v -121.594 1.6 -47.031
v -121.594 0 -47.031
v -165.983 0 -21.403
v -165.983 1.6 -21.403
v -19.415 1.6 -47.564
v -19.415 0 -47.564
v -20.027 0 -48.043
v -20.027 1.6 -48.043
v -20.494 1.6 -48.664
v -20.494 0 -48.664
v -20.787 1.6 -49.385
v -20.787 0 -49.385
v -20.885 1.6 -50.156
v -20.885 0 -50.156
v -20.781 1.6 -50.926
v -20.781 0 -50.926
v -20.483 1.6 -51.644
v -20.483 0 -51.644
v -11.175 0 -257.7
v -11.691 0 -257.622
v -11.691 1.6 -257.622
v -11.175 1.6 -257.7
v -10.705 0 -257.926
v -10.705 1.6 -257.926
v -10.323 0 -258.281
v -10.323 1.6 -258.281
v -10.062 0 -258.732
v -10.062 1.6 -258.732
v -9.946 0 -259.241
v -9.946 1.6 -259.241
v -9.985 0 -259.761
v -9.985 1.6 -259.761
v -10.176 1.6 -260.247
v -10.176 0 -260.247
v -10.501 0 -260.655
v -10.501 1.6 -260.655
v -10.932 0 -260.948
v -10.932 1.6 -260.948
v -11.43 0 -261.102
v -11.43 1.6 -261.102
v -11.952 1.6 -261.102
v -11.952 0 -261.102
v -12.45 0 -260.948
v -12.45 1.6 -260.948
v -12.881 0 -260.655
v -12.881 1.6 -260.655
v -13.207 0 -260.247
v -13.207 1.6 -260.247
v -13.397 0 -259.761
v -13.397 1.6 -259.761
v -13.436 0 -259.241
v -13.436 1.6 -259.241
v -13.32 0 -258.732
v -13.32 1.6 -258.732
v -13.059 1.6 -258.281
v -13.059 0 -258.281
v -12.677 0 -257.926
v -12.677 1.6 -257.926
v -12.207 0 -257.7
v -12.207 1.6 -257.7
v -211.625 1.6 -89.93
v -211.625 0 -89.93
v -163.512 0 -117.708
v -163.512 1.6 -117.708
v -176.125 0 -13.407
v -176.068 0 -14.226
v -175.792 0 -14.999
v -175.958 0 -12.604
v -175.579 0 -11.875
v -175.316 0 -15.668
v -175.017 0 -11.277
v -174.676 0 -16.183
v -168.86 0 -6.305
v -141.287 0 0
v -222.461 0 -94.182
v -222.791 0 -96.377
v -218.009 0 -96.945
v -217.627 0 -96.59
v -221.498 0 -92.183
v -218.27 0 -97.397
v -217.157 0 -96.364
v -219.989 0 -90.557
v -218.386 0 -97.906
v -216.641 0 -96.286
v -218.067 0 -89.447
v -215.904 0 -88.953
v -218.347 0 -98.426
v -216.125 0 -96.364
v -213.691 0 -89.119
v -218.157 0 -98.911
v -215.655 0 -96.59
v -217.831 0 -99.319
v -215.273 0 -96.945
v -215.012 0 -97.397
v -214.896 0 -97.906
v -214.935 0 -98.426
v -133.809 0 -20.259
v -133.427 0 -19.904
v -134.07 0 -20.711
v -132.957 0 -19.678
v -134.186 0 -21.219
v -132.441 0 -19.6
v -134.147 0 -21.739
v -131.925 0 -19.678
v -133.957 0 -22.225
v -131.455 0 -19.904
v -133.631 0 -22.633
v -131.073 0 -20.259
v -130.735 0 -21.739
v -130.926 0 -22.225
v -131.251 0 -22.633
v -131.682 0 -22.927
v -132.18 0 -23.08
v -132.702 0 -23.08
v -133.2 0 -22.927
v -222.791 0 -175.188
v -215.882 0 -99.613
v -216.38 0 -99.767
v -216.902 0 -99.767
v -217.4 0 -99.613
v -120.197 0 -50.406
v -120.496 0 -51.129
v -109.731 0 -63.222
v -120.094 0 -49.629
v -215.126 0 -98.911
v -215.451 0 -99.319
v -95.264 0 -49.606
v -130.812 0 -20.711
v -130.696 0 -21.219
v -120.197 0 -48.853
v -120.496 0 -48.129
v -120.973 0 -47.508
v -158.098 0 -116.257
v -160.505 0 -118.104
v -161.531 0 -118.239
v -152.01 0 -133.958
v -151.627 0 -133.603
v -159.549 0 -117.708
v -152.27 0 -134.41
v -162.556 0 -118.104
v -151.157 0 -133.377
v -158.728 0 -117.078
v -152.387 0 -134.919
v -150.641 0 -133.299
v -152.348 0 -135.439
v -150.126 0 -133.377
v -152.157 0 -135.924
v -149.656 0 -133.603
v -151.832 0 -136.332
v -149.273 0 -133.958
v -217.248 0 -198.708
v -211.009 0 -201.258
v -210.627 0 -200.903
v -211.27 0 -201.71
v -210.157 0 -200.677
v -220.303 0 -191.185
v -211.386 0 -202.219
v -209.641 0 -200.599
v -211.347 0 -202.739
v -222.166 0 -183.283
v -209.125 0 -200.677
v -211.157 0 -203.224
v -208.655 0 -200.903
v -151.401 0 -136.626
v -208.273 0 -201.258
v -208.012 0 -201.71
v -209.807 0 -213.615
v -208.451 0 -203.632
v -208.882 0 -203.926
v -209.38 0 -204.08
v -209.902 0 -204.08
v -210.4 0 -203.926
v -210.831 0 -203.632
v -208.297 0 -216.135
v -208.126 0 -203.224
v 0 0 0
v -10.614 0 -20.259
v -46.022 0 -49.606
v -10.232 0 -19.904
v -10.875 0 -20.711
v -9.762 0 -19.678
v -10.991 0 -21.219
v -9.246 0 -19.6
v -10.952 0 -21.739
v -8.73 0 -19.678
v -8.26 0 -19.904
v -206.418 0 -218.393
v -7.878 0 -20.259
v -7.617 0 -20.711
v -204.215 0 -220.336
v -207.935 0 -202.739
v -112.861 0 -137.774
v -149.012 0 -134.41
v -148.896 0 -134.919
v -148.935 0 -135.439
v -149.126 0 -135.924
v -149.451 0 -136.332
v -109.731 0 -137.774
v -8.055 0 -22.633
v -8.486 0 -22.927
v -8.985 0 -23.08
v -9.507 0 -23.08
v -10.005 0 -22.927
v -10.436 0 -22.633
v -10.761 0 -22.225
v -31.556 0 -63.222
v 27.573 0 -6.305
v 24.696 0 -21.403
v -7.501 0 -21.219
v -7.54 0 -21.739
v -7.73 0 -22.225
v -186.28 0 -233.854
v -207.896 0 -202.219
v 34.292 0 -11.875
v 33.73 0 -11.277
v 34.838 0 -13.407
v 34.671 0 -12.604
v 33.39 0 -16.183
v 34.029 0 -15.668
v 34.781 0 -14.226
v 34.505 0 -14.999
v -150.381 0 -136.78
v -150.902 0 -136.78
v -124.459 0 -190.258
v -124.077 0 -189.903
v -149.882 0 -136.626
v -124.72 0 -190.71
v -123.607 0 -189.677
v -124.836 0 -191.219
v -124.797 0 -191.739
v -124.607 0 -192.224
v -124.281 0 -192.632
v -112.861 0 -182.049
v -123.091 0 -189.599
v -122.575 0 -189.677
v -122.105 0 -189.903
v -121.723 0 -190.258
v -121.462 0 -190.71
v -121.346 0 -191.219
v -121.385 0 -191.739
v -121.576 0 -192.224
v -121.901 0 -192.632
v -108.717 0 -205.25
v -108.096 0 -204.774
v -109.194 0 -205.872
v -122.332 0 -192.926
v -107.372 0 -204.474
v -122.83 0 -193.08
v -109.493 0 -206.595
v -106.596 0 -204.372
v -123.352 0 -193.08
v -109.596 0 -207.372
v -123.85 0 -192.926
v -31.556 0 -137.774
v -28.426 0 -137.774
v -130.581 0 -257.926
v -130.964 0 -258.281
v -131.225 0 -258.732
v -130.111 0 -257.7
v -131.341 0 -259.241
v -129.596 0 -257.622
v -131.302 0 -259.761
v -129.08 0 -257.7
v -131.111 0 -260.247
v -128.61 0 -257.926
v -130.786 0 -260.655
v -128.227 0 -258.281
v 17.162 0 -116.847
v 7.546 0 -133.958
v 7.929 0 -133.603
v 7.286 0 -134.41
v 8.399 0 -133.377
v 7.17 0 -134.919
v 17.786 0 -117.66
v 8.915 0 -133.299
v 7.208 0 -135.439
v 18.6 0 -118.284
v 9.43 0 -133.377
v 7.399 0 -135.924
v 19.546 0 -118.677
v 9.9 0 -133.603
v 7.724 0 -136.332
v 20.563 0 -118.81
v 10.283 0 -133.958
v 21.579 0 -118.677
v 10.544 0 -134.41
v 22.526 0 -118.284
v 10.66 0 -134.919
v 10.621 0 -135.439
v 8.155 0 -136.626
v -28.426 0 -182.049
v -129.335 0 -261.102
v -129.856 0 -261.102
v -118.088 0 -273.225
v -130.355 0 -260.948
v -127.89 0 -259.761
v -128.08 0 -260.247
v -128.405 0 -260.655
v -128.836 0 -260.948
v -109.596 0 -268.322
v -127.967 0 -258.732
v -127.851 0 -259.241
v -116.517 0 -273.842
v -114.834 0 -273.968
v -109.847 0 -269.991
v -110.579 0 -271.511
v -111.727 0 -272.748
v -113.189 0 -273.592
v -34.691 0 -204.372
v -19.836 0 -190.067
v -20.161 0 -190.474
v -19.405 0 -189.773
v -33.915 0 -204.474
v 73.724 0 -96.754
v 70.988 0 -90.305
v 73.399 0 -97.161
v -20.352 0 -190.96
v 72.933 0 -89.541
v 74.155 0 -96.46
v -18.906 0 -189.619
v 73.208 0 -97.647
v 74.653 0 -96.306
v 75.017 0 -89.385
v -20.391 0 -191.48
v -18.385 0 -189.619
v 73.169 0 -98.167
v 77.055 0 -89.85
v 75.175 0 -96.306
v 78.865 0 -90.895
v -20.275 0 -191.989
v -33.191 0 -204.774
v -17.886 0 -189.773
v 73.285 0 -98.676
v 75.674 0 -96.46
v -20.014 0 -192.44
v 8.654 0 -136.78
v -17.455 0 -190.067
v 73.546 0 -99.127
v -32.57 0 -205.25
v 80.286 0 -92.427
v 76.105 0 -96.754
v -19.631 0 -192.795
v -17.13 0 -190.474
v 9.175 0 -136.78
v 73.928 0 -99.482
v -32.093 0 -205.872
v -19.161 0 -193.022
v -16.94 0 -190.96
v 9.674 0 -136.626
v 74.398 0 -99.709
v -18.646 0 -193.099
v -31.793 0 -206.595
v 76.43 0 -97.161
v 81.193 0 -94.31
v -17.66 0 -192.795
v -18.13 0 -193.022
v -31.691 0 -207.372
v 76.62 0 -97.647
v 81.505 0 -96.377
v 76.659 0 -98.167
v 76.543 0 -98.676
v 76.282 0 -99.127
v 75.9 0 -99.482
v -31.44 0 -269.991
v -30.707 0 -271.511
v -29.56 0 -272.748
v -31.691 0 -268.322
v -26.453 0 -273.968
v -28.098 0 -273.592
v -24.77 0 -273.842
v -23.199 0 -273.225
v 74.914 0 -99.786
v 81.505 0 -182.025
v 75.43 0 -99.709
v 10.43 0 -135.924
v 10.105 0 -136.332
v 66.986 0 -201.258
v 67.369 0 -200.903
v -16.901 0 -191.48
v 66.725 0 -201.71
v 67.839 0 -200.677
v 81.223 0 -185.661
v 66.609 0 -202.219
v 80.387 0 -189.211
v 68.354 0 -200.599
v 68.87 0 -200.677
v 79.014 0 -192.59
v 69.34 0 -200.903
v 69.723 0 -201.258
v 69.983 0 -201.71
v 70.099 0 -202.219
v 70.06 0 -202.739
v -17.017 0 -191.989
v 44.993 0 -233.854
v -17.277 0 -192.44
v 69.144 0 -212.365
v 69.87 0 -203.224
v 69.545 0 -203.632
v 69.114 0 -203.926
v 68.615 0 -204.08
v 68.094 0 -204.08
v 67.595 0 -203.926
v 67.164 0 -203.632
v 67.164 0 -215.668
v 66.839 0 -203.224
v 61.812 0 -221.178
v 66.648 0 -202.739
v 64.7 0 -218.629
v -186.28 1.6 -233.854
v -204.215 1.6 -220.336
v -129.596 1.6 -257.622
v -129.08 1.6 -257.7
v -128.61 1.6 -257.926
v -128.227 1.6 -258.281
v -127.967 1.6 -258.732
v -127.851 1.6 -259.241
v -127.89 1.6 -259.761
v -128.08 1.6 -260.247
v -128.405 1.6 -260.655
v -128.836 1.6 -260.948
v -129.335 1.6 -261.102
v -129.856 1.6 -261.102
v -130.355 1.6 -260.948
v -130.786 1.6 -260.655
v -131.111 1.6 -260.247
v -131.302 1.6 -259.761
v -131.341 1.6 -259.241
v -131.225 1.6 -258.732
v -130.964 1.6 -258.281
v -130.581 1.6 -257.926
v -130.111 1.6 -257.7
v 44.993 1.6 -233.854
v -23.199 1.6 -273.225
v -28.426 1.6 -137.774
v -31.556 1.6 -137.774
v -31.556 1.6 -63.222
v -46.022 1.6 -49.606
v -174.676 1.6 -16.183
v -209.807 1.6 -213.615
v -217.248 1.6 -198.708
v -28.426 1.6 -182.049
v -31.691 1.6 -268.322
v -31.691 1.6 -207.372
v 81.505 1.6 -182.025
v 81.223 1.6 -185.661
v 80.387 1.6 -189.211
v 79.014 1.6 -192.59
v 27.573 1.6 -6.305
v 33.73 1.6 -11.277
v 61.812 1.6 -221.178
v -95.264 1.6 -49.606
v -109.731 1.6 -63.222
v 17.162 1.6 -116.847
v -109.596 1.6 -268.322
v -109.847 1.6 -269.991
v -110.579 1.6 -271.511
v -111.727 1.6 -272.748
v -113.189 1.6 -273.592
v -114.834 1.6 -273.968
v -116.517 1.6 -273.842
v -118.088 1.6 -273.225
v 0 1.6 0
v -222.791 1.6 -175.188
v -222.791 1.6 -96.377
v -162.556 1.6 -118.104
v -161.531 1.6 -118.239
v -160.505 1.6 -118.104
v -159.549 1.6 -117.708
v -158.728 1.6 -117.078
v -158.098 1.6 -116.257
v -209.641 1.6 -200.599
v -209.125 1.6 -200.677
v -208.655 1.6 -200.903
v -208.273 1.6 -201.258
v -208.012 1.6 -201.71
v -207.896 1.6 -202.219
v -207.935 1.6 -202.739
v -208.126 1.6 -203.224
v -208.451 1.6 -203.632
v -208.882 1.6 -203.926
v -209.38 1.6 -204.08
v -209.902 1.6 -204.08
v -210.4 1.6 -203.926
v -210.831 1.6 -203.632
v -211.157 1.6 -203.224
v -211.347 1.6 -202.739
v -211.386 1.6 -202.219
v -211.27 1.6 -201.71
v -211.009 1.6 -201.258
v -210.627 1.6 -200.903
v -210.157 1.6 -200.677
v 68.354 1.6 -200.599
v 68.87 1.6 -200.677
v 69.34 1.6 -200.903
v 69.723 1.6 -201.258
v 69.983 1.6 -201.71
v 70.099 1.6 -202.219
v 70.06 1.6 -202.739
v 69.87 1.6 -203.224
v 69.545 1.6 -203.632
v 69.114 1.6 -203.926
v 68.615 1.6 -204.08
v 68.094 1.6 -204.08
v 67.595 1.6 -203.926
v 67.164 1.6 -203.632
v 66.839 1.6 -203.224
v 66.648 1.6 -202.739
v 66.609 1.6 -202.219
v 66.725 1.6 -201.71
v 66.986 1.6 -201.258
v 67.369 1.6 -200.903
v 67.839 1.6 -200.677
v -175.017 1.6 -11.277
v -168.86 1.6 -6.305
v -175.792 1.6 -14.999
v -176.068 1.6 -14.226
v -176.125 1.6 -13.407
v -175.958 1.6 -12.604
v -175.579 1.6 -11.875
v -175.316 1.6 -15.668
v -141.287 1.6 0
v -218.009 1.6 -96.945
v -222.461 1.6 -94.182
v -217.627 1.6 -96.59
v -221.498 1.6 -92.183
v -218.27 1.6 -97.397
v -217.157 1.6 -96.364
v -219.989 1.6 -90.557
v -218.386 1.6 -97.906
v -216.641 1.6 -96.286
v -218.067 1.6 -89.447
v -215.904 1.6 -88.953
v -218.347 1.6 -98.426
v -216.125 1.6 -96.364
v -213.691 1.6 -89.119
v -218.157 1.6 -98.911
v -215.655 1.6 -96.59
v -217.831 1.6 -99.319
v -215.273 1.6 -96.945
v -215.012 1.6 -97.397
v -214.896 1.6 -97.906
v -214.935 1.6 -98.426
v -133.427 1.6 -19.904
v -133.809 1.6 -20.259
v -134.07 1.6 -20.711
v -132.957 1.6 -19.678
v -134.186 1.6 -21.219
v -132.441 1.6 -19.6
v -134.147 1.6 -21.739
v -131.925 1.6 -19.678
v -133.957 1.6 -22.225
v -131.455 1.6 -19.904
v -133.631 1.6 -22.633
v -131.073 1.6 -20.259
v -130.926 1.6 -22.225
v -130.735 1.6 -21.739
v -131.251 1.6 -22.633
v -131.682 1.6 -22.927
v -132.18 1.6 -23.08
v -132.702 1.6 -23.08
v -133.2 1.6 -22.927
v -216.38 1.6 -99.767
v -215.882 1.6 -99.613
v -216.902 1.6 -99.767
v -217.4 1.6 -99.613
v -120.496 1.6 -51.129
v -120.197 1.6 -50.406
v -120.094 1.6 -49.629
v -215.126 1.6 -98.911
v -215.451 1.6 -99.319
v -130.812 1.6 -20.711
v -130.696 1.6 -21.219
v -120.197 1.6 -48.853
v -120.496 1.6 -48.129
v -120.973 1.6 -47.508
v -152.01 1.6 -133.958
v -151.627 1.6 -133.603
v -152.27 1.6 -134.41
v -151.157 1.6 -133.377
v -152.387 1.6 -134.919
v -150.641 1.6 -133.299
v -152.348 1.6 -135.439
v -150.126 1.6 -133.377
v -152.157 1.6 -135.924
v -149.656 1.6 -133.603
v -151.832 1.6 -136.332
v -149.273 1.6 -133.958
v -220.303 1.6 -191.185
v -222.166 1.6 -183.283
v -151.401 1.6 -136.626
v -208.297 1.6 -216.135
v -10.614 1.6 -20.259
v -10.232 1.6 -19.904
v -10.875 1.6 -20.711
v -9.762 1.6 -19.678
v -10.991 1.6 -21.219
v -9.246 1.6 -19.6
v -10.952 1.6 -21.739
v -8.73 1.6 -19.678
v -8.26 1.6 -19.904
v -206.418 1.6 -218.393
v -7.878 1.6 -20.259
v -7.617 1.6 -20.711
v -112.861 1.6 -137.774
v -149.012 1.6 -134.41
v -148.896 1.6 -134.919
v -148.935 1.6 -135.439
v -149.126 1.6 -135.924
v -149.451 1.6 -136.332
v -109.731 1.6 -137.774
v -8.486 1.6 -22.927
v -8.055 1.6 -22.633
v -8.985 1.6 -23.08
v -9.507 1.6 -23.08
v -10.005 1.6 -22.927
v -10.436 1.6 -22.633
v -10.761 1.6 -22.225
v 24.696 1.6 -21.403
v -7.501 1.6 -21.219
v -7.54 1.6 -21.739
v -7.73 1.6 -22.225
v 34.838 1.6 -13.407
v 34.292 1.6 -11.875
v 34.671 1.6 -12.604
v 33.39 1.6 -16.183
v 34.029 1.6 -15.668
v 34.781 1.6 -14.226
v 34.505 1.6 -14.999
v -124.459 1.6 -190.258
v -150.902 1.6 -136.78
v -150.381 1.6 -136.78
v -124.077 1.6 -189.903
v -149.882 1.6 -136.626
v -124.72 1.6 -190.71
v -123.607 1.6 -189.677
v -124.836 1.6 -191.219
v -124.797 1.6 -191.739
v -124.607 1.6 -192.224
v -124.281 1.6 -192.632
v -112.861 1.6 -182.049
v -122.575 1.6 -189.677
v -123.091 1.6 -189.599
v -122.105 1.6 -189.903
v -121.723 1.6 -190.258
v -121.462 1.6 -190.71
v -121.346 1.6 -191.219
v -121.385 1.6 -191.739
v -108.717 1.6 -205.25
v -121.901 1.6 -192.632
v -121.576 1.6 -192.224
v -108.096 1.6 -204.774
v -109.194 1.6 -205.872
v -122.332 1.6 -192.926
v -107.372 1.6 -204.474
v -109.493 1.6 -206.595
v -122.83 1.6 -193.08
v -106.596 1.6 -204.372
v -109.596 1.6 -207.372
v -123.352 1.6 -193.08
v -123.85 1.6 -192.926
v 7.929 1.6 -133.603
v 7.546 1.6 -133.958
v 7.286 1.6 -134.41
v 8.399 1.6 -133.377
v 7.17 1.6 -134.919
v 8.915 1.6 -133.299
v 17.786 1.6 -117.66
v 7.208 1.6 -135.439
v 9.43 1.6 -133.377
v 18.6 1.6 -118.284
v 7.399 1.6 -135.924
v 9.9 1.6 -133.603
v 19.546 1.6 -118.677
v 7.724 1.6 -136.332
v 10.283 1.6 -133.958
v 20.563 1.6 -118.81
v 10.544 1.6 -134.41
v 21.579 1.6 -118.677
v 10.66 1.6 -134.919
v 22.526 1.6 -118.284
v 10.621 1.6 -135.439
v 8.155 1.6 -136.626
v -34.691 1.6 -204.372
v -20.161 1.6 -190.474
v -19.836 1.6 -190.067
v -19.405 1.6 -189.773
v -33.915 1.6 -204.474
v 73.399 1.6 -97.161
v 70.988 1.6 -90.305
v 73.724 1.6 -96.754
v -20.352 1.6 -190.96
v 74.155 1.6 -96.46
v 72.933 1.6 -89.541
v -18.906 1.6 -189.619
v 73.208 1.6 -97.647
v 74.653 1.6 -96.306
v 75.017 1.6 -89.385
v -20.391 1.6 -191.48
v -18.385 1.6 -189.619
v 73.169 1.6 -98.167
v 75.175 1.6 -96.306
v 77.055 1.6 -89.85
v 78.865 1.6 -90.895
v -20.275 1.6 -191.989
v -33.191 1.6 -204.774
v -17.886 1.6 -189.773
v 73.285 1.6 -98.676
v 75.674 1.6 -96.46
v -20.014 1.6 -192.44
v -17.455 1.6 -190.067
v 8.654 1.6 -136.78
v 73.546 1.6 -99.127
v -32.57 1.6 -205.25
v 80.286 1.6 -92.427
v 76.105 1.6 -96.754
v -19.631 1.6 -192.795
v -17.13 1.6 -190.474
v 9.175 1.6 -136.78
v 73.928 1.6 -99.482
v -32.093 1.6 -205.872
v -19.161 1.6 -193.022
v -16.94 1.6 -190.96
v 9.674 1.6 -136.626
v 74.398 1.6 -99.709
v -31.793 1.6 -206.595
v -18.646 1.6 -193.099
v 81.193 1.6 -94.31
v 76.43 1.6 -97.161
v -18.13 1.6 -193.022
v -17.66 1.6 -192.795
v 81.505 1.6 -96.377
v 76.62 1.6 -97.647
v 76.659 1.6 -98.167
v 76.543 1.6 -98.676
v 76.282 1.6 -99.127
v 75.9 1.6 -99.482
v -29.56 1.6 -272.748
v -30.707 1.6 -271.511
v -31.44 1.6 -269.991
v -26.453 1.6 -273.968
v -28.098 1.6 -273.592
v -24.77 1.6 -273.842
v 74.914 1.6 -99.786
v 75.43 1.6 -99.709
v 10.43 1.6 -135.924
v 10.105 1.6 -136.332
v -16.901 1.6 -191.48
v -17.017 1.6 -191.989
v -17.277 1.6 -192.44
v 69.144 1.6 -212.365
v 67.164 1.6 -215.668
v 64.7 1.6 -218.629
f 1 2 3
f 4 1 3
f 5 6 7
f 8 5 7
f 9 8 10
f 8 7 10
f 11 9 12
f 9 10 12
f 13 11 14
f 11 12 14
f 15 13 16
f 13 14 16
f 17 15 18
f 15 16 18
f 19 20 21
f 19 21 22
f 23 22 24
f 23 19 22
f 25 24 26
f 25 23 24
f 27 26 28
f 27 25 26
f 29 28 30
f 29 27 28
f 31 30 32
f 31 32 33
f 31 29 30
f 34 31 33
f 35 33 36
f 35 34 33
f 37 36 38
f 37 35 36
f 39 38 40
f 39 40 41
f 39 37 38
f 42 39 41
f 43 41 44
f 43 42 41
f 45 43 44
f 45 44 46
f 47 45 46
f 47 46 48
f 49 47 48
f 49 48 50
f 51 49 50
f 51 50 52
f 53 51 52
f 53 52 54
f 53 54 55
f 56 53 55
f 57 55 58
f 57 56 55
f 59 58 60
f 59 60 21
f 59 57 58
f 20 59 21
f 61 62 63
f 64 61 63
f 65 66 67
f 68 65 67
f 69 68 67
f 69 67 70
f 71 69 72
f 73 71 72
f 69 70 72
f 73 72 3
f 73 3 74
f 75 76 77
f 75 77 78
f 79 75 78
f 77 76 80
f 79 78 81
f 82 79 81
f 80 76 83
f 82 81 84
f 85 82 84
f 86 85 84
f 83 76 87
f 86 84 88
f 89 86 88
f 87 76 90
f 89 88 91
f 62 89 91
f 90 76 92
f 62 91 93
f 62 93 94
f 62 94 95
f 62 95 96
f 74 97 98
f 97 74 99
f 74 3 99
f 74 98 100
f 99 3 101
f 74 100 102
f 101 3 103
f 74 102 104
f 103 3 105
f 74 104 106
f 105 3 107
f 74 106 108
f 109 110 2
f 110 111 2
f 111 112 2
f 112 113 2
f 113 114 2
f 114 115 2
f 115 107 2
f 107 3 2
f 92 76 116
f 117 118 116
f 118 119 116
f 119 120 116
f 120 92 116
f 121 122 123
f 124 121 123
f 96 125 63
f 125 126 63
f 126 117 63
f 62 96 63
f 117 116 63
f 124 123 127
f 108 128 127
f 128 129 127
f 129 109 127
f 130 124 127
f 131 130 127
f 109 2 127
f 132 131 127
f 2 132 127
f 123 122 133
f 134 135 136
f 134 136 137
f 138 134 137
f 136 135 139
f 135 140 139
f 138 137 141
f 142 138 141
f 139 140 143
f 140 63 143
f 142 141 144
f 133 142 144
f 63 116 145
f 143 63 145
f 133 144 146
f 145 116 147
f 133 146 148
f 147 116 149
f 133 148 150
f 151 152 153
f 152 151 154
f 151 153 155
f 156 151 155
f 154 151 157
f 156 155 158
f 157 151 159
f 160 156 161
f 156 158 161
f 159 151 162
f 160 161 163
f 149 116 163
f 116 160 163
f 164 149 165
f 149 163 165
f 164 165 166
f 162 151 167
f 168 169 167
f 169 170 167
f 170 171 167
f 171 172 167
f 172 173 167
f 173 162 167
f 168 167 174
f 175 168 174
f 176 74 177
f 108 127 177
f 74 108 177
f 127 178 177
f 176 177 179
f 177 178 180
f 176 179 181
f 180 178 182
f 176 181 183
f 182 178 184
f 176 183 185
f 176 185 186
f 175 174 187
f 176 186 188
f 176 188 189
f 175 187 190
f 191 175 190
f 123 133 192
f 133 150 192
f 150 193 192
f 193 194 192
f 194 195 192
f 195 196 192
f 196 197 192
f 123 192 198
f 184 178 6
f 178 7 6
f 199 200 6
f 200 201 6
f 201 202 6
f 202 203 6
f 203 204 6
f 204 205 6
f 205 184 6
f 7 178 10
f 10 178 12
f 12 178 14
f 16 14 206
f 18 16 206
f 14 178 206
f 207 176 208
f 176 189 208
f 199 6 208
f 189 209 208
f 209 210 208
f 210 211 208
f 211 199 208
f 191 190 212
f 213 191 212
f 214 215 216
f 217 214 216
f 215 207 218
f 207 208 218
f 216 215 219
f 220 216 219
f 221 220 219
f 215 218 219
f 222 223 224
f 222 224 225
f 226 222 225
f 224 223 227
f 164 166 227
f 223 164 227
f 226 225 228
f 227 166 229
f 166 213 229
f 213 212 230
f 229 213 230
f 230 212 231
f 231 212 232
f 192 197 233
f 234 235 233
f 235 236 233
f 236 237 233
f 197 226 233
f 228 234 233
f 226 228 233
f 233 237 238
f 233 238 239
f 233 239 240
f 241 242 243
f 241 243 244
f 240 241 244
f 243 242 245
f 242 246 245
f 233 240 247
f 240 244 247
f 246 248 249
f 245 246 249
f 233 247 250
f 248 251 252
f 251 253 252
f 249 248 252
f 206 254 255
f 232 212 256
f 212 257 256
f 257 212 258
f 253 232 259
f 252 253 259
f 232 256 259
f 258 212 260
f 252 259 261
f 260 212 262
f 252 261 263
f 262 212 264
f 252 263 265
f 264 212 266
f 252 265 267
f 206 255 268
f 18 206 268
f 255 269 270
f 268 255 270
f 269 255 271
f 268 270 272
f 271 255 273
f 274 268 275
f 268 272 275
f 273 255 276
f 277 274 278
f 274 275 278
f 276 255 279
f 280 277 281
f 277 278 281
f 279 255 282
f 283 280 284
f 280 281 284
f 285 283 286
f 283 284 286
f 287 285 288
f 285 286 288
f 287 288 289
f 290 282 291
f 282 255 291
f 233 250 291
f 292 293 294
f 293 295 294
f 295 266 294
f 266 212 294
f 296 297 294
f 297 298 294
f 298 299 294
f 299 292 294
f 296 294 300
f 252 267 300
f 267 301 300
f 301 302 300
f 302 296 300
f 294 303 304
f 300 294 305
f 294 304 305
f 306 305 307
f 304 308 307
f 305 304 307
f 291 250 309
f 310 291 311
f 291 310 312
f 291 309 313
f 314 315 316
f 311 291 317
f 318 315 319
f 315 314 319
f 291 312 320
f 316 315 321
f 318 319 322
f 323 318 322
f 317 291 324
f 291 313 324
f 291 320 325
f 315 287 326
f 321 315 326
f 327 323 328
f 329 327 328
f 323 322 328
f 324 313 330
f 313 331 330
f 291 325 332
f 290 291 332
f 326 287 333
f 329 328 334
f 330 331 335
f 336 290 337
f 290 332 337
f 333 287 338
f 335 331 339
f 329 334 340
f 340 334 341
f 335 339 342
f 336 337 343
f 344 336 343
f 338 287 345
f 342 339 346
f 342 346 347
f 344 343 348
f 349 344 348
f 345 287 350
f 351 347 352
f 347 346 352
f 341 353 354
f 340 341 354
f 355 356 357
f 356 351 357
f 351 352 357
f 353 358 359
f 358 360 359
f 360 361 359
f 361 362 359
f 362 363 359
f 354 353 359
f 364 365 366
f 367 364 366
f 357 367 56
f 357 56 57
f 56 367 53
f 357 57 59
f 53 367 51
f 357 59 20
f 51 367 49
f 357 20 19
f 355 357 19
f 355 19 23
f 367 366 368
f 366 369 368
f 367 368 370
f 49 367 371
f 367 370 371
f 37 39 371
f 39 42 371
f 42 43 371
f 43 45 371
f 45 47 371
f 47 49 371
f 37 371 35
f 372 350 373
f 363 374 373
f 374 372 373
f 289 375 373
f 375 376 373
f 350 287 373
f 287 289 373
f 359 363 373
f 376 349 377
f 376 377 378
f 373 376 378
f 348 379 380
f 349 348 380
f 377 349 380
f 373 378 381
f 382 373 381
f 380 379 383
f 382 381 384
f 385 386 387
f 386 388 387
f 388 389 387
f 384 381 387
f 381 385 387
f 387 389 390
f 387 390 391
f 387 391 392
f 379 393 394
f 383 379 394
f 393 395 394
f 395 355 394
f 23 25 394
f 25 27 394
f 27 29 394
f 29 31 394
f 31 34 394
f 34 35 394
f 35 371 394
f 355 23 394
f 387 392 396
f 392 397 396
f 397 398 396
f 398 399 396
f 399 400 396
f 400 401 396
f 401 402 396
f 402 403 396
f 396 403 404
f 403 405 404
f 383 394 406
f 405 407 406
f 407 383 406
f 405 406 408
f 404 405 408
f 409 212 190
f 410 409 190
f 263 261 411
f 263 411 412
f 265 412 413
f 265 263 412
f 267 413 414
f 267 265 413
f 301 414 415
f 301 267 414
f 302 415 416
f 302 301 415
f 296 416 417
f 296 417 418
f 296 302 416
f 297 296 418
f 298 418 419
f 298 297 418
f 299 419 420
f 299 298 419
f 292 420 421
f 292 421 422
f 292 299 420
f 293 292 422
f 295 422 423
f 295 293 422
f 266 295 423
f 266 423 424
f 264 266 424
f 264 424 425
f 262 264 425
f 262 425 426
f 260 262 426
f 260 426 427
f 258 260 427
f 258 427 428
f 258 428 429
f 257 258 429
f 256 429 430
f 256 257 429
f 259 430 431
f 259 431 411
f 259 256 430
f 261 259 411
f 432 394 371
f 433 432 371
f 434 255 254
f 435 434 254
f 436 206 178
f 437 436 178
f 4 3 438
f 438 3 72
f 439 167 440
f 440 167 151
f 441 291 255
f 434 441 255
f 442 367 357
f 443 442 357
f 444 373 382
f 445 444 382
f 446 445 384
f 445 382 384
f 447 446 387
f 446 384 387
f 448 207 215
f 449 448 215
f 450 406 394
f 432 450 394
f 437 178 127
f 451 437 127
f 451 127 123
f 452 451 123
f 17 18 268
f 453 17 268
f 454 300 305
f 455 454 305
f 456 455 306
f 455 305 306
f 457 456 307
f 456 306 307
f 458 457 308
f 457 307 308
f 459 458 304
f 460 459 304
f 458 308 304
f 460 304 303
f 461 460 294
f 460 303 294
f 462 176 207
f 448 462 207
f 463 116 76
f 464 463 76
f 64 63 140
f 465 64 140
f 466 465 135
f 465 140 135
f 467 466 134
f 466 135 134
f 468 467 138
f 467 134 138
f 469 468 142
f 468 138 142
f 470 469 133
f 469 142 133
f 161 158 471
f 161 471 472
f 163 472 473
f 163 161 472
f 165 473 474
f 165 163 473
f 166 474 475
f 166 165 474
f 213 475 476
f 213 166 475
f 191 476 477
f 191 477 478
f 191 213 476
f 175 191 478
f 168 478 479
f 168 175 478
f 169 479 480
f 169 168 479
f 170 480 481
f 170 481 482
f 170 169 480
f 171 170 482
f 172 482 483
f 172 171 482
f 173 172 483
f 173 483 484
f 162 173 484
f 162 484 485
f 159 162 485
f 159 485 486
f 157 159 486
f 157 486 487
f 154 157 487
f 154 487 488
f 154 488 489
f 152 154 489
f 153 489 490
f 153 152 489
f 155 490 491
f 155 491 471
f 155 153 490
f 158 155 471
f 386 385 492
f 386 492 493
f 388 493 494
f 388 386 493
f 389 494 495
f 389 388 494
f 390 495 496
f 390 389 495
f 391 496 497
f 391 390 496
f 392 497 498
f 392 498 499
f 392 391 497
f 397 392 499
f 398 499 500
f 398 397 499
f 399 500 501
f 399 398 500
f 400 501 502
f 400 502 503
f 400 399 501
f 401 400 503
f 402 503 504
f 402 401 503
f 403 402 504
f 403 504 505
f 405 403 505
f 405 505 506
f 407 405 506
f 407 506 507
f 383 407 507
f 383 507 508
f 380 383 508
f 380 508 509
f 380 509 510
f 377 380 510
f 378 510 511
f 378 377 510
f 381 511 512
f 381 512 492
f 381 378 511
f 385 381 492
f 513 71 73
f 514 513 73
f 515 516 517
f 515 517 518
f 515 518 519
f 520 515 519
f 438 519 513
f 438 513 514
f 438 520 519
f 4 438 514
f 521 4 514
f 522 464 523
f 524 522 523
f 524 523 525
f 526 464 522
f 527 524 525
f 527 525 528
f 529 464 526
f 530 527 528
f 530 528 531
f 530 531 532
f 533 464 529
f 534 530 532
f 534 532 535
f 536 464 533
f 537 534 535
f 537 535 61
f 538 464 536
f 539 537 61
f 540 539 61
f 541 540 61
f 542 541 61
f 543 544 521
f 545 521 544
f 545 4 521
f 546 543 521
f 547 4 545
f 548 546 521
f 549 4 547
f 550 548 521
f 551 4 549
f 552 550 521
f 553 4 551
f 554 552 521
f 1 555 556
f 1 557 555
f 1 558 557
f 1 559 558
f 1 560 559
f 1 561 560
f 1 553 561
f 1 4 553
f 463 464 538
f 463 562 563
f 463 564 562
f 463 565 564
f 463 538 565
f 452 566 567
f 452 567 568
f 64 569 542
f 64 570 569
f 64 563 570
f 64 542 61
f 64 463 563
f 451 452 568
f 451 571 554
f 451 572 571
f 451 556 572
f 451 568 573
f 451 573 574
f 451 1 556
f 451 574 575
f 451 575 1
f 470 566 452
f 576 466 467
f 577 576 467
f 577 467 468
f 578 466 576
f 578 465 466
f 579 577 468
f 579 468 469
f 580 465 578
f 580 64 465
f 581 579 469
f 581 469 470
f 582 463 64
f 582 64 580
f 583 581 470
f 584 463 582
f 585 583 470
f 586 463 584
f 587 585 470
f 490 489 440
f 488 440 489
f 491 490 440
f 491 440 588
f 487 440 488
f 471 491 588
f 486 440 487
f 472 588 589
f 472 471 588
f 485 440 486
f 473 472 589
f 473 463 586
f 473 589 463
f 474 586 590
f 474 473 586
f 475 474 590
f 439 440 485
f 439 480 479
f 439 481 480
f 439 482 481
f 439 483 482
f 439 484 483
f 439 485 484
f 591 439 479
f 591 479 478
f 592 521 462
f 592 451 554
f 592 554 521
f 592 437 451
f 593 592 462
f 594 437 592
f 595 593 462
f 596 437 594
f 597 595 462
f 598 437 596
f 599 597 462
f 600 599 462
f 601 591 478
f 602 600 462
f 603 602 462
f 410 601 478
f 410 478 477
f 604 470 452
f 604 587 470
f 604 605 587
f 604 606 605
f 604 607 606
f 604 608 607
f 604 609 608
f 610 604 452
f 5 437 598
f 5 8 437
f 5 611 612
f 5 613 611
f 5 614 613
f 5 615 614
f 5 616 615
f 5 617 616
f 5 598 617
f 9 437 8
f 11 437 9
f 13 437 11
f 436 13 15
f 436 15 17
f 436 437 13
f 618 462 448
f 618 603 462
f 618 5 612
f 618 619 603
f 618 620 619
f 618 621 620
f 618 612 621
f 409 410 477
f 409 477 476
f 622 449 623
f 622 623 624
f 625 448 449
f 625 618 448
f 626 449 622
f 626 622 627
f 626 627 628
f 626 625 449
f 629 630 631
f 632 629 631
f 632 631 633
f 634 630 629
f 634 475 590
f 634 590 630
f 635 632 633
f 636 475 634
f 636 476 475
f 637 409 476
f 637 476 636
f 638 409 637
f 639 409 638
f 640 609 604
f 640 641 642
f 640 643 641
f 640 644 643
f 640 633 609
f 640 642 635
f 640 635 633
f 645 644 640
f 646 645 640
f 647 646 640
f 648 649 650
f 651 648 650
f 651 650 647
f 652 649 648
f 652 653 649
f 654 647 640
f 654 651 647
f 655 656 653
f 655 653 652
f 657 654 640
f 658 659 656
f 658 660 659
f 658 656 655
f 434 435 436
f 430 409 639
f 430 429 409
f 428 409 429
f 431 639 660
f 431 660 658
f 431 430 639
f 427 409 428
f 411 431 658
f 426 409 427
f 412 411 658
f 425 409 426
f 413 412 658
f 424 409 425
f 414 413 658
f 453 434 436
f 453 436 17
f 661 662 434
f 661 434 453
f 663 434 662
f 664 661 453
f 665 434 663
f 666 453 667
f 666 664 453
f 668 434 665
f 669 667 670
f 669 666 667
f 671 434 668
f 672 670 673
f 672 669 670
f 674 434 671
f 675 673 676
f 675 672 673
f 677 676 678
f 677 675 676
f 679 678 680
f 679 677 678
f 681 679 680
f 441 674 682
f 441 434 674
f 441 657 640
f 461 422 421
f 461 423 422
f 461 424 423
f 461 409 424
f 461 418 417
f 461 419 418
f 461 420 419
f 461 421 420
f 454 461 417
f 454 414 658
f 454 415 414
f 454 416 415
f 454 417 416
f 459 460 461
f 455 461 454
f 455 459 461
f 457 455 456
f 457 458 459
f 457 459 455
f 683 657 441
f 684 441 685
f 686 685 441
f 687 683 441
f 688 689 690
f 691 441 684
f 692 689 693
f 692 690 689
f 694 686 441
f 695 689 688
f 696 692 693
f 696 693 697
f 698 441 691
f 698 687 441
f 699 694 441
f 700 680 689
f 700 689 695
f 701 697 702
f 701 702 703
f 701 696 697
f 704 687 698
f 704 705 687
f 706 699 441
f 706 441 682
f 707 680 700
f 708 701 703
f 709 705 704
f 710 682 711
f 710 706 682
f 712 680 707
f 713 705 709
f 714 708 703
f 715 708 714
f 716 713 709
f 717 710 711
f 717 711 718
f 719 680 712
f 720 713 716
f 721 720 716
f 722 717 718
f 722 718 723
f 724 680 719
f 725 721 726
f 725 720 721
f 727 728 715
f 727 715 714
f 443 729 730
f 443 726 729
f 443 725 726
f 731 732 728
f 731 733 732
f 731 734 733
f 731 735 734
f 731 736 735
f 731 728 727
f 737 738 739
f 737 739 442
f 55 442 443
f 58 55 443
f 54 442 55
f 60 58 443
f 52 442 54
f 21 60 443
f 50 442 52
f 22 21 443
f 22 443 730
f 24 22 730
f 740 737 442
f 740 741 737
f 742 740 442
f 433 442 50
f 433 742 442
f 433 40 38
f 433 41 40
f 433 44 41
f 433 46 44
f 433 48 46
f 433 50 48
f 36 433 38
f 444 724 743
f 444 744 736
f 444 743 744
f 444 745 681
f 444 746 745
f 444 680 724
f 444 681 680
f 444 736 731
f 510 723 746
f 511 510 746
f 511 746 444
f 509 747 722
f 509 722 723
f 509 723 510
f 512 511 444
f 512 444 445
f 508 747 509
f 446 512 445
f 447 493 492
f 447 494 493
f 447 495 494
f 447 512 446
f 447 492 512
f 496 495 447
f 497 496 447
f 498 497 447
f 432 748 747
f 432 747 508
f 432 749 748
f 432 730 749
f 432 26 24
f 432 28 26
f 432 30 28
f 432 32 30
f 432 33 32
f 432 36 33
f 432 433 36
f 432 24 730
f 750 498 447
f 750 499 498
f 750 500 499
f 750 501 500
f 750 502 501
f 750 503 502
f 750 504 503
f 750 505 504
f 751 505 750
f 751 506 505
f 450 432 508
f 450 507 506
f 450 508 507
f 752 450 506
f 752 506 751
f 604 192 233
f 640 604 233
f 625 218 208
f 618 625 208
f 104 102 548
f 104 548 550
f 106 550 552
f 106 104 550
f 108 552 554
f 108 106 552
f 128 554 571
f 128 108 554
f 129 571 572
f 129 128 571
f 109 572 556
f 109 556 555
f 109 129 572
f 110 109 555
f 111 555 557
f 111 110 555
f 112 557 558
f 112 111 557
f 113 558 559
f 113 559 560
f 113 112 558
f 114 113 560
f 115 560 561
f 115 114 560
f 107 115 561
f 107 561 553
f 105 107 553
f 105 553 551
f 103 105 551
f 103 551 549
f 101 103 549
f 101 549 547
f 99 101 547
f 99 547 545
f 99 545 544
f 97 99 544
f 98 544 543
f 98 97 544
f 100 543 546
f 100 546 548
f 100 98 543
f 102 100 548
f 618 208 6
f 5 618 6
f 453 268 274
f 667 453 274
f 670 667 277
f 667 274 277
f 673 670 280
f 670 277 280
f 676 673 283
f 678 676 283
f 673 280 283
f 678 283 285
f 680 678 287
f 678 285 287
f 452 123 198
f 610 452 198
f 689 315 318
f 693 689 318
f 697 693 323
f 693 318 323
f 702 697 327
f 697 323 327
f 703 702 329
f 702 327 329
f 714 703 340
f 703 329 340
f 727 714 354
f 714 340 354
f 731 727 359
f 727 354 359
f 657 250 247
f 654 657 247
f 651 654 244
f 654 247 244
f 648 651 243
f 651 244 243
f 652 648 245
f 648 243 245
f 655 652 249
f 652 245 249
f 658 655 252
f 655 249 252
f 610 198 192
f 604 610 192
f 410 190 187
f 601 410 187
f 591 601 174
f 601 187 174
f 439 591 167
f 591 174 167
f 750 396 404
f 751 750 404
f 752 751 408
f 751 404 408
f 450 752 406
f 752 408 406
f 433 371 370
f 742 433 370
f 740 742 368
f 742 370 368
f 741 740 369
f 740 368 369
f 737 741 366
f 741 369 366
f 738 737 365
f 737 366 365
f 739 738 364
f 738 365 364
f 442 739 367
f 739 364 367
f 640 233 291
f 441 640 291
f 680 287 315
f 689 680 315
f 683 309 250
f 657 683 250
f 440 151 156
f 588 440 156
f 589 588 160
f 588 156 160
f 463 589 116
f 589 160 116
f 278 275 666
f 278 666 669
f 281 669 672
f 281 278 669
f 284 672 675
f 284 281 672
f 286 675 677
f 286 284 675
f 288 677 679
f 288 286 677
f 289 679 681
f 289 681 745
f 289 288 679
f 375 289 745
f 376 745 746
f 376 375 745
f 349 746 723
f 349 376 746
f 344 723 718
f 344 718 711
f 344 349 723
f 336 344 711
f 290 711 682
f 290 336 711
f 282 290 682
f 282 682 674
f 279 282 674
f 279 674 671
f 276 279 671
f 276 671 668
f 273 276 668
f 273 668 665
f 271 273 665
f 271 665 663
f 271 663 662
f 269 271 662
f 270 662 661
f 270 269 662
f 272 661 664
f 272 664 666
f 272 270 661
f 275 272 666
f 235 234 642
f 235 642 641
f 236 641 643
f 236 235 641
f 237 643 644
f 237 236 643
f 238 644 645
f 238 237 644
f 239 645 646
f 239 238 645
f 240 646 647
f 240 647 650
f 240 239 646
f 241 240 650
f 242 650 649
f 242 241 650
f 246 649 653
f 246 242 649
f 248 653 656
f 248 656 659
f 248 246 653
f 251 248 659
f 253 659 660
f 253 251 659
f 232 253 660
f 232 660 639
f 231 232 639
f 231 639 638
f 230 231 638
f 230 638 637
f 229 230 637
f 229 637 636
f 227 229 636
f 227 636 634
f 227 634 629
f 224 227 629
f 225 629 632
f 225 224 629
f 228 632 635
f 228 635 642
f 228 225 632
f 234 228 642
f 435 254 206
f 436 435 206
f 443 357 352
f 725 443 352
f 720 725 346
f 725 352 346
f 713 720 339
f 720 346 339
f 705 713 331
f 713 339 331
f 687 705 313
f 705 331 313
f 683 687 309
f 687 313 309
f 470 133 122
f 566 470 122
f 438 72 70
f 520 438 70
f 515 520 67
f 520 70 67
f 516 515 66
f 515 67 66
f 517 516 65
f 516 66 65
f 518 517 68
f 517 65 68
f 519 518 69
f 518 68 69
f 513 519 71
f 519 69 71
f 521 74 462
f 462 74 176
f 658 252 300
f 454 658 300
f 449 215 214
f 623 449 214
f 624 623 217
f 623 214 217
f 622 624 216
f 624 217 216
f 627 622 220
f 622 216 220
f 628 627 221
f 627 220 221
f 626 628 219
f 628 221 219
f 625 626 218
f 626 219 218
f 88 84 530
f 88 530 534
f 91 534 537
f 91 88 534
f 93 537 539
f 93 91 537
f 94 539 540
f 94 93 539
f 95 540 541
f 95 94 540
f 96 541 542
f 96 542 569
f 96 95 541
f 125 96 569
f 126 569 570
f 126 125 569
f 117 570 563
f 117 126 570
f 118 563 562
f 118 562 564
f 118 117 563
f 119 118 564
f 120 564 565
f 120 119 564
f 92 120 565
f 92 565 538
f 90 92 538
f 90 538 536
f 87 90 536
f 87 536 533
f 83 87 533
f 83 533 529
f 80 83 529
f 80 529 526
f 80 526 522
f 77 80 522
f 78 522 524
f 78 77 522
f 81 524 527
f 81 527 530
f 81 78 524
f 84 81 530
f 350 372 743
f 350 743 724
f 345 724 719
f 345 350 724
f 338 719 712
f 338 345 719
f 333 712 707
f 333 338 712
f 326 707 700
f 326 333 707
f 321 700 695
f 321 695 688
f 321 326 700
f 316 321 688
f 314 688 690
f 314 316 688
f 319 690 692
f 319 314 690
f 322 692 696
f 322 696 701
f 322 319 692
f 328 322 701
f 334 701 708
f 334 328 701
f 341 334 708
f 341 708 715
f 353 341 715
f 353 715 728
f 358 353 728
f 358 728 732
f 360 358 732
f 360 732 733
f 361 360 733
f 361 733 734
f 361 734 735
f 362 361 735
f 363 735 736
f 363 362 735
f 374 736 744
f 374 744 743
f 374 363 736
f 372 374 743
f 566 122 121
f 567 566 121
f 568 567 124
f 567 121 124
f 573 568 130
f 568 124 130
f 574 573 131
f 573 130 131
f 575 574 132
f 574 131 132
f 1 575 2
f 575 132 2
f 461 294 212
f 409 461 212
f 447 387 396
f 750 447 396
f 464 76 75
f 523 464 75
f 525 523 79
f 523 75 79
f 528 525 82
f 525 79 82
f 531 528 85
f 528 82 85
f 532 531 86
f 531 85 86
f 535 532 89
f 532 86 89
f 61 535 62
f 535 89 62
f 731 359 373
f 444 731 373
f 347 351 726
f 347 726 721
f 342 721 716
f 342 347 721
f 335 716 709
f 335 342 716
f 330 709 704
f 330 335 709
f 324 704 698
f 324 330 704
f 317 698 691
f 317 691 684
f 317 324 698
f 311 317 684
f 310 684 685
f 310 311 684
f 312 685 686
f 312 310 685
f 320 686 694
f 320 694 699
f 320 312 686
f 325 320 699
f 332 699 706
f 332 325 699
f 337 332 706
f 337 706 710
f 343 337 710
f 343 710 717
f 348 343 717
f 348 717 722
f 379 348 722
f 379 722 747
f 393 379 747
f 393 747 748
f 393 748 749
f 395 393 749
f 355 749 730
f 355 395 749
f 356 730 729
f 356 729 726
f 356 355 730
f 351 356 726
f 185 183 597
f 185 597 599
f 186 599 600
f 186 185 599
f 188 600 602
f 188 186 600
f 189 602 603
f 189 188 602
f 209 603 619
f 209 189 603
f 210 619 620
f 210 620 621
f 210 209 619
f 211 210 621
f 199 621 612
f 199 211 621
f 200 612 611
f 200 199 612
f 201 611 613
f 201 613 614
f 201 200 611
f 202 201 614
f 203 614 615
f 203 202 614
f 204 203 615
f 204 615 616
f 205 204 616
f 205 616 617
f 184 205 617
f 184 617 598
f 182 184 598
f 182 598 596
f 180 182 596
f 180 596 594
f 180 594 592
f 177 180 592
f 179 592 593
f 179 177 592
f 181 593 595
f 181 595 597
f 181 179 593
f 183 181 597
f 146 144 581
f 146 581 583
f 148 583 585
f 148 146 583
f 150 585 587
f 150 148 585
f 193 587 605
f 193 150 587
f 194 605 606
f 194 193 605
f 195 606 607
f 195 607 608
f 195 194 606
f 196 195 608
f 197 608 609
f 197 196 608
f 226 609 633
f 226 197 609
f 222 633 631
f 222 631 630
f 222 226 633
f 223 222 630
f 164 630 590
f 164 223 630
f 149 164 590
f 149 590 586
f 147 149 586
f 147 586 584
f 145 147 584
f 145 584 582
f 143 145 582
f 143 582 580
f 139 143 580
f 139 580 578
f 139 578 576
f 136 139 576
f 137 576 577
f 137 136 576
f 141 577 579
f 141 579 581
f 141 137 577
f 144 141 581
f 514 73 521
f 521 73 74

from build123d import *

# Parameters (mm, degrees)
SKETCH1_R           = 1.75
BOSS_EXTRUDE1_DEPTH = 1.6


with BuildPart() as part:
    # Sketch1 → Boss-Extrude1 (new body)
    with BuildSketch(Plane(origin=(0, 0, 0), x_dir=(1, 0, 0), z_dir=(0, 1, 0))):
        with BuildLine():
            Line((24.696313384, 21.403189927), (-19.414899465, 47.563680085))
            ThreePointArc((-19.414899465, 47.563680085), (-20.786874634, 49.384536896), (-20.482680557, 51.644028288))
            Line((-20.482680557, 51.644028288), (17.162414168, 116.847245007))
            ThreePointArc((17.162414168, 116.847245007), (19.546471274, 118.676596366), (22.525800971, 118.28436017))
            Line((22.525800971, 118.28436017), (70.987796177, 90.304814192))
            ThreePointArc((70.987796177, 90.304814192), (77.999004119, 90.304814192), (81.50460809, 96.376698381))
            Line((81.50460809, 96.376698381), (81.50460809, 182.02519482))
            ThreePointArc((81.50460809, 182.02519482), (80.873629228, 187.452491566), (79.01435205, 192.590270527))
            Line((79.01435205, 192.590270527), (69.144094326, 212.364639151))
            ThreePointArc((69.144094326, 212.364639151), (65.989183491, 217.196365343), (61.81193417, 221.177524531))
            Line((61.81193417, 221.177524531), (44.99314954, 233.854205885))
            Line((44.99314954, 233.854205885), (-23.199197227, 273.225075648))
            ThreePointArc((-23.199197227, 273.225075648), (-28.860512938, 273.225075648), (-31.691170793, 268.322232423))
            Line((-31.691170793, 268.322232423), (-31.691170793, 207.371759387))
            ThreePointArc((-31.691170793, 207.371759387), (-32.56985045, 205.250439044), (-34.691170793, 204.371759387))
            Line((-34.691170793, 204.371759387), (-106.595635326, 204.371759387))
            ThreePointArc((-106.595635326, 204.371759387), (-108.71695567, 205.250439044), (-109.595635326, 207.371759387))
            Line((-109.595635326, 207.371759387), (-109.595635326, 268.322232423))
            ThreePointArc((-109.595635326, 268.322232423), (-112.426293182, 273.225075648), (-118.087608892, 273.225075648))
            Line((-118.087608892, 273.225075648), (-186.279955659, 233.854205885))
            Line((-186.279955659, 233.854205885), (-204.21495553, 220.336208987))
            ThreePointArc((-204.21495553, 220.336208987), (-207.400637767, 217.300070339), (-209.806657286, 213.615266508))
            Line((-209.806657286, 213.615266508), (-217.247579174, 198.707901735))
            ThreePointArc((-217.247579174, 198.707901735), (-221.386722215, 187.270122423), (-222.791414209, 175.187815477))
            Line((-222.791414209, 175.187815477), (-222.791414209, 96.376698381))
            ThreePointArc((-222.791414209, 96.376698381), (-219.069332913, 89.929864467), (-211.625170321, 89.929864467))
            Line((-211.625170321, 89.929864467), (-163.512384372, 117.707794386))
            ThreePointArc((-163.512384372, 117.707794386), (-160.504762554, 118.10375531), (-158.098066116, 116.257032182))
            Line((-158.098066116, 116.257032182), (-120.496410943, 51.129054973))
            ThreePointArc((-120.496410943, 51.129054973), (-120.196709676, 48.852597838), (-121.594487155, 47.030978762))
            Line((-121.594487155, 47.030978762), (-165.983119503, 21.403189927))
            Line((-165.983119503, 21.403189927), (-174.676412504, 16.182853027))
            ThreePointArc((-174.676412504, 16.182853027), (-176.124776412, 13.818668342), (-175.016914475, 11.277060748))
            Line((-175.016914475, 11.277060748), (-168.860075369, 6.304549502))
            Line((-168.860075369, 6.304549502), (-141.286806119, 0))
            Line((-141.286806119, 0), (0, 0))
            Line((0, 0), (27.57326925, 6.304549502))
            Line((27.57326925, 6.304549502), (33.730108356, 11.277060748))
            ThreePointArc((33.730108356, 11.277060748), (34.837970293, 13.818668342), (33.389606385, 16.182853027))
            Line((33.389606385, 16.182853027), (24.696313384, 21.403189927))
        make_face()
        with Locations(Location((-123.091146174, 191.349343748, 0), (0, 0, 270))):
            Circle(SKETCH1_R, mode=Mode.SUBTRACT)
        with Locations(Location((-216.641081117, 98.036380822, 0), (0, 0, 270))):
            Circle(SKETCH1_R, mode=Mode.SUBTRACT)
        with Locations(Location((-18.645659945, 191.349343748, 0), (0, 0, 90))):
            Circle(SKETCH1_R, mode=Mode.SUBTRACT)
        with Locations(Location((74.914274997, 98.036380822, 0), (0, 0, 90))):
            Circle(SKETCH1_R, mode=Mode.SUBTRACT)
        with Locations(Location((-9.245725003, 21.35, 0), (0, 0, 270))):
            Circle(SKETCH1_R, mode=Mode.SUBTRACT)
        with Locations(Location((-132.441081117, 21.35, 0), (0, 0, 270))):
            Circle(SKETCH1_R, mode=Mode.SUBTRACT)
        with Locations(Location((-150.641414209, 135.049343748, 0), (0, 0, 270))):
            Circle(SKETCH1_R, mode=Mode.SUBTRACT)
        with Locations(Location((8.91460809, 135.049343748, 0), (0, 0, 270))):
            Circle(SKETCH1_R, mode=Mode.SUBTRACT)
        with Locations(Location((68.354340055, 202.349343748, 0), (0, 0, 270))):
            Circle(SKETCH1_R, mode=Mode.SUBTRACT)
        with Locations(Location((-11.691170793, 259.371759387, 0), (0, 0, 270))):
            Circle(SKETCH1_R, mode=Mode.SUBTRACT)
        with Locations(Location((-129.595635326, 259.371759387, 0), (0, 0, 270))):
            Circle(SKETCH1_R, mode=Mode.SUBTRACT)
        with Locations(Location((-209.641146174, 202.349343748, 0), (0, 0, 270))):
            Circle(SKETCH1_R, mode=Mode.SUBTRACT)
        Polygon((-31.555725003, 63.222149708), (-46.022445575, 49.606380822), (-95.264360544, 49.606380822), (-109.731081117, 63.222149708), (-109.731081117, 137.774232151), (-112.861146174, 137.774232151), (-112.861146174, 182.049343748), (-28.425659945, 182.049343748), (-28.425659945, 137.774232151), (-31.555725003, 137.774232151), align=None, mode=Mode.SUBTRACT)
    extrude(amount=BOSS_EXTRUDE1_DEPTH)


solid = part.part
